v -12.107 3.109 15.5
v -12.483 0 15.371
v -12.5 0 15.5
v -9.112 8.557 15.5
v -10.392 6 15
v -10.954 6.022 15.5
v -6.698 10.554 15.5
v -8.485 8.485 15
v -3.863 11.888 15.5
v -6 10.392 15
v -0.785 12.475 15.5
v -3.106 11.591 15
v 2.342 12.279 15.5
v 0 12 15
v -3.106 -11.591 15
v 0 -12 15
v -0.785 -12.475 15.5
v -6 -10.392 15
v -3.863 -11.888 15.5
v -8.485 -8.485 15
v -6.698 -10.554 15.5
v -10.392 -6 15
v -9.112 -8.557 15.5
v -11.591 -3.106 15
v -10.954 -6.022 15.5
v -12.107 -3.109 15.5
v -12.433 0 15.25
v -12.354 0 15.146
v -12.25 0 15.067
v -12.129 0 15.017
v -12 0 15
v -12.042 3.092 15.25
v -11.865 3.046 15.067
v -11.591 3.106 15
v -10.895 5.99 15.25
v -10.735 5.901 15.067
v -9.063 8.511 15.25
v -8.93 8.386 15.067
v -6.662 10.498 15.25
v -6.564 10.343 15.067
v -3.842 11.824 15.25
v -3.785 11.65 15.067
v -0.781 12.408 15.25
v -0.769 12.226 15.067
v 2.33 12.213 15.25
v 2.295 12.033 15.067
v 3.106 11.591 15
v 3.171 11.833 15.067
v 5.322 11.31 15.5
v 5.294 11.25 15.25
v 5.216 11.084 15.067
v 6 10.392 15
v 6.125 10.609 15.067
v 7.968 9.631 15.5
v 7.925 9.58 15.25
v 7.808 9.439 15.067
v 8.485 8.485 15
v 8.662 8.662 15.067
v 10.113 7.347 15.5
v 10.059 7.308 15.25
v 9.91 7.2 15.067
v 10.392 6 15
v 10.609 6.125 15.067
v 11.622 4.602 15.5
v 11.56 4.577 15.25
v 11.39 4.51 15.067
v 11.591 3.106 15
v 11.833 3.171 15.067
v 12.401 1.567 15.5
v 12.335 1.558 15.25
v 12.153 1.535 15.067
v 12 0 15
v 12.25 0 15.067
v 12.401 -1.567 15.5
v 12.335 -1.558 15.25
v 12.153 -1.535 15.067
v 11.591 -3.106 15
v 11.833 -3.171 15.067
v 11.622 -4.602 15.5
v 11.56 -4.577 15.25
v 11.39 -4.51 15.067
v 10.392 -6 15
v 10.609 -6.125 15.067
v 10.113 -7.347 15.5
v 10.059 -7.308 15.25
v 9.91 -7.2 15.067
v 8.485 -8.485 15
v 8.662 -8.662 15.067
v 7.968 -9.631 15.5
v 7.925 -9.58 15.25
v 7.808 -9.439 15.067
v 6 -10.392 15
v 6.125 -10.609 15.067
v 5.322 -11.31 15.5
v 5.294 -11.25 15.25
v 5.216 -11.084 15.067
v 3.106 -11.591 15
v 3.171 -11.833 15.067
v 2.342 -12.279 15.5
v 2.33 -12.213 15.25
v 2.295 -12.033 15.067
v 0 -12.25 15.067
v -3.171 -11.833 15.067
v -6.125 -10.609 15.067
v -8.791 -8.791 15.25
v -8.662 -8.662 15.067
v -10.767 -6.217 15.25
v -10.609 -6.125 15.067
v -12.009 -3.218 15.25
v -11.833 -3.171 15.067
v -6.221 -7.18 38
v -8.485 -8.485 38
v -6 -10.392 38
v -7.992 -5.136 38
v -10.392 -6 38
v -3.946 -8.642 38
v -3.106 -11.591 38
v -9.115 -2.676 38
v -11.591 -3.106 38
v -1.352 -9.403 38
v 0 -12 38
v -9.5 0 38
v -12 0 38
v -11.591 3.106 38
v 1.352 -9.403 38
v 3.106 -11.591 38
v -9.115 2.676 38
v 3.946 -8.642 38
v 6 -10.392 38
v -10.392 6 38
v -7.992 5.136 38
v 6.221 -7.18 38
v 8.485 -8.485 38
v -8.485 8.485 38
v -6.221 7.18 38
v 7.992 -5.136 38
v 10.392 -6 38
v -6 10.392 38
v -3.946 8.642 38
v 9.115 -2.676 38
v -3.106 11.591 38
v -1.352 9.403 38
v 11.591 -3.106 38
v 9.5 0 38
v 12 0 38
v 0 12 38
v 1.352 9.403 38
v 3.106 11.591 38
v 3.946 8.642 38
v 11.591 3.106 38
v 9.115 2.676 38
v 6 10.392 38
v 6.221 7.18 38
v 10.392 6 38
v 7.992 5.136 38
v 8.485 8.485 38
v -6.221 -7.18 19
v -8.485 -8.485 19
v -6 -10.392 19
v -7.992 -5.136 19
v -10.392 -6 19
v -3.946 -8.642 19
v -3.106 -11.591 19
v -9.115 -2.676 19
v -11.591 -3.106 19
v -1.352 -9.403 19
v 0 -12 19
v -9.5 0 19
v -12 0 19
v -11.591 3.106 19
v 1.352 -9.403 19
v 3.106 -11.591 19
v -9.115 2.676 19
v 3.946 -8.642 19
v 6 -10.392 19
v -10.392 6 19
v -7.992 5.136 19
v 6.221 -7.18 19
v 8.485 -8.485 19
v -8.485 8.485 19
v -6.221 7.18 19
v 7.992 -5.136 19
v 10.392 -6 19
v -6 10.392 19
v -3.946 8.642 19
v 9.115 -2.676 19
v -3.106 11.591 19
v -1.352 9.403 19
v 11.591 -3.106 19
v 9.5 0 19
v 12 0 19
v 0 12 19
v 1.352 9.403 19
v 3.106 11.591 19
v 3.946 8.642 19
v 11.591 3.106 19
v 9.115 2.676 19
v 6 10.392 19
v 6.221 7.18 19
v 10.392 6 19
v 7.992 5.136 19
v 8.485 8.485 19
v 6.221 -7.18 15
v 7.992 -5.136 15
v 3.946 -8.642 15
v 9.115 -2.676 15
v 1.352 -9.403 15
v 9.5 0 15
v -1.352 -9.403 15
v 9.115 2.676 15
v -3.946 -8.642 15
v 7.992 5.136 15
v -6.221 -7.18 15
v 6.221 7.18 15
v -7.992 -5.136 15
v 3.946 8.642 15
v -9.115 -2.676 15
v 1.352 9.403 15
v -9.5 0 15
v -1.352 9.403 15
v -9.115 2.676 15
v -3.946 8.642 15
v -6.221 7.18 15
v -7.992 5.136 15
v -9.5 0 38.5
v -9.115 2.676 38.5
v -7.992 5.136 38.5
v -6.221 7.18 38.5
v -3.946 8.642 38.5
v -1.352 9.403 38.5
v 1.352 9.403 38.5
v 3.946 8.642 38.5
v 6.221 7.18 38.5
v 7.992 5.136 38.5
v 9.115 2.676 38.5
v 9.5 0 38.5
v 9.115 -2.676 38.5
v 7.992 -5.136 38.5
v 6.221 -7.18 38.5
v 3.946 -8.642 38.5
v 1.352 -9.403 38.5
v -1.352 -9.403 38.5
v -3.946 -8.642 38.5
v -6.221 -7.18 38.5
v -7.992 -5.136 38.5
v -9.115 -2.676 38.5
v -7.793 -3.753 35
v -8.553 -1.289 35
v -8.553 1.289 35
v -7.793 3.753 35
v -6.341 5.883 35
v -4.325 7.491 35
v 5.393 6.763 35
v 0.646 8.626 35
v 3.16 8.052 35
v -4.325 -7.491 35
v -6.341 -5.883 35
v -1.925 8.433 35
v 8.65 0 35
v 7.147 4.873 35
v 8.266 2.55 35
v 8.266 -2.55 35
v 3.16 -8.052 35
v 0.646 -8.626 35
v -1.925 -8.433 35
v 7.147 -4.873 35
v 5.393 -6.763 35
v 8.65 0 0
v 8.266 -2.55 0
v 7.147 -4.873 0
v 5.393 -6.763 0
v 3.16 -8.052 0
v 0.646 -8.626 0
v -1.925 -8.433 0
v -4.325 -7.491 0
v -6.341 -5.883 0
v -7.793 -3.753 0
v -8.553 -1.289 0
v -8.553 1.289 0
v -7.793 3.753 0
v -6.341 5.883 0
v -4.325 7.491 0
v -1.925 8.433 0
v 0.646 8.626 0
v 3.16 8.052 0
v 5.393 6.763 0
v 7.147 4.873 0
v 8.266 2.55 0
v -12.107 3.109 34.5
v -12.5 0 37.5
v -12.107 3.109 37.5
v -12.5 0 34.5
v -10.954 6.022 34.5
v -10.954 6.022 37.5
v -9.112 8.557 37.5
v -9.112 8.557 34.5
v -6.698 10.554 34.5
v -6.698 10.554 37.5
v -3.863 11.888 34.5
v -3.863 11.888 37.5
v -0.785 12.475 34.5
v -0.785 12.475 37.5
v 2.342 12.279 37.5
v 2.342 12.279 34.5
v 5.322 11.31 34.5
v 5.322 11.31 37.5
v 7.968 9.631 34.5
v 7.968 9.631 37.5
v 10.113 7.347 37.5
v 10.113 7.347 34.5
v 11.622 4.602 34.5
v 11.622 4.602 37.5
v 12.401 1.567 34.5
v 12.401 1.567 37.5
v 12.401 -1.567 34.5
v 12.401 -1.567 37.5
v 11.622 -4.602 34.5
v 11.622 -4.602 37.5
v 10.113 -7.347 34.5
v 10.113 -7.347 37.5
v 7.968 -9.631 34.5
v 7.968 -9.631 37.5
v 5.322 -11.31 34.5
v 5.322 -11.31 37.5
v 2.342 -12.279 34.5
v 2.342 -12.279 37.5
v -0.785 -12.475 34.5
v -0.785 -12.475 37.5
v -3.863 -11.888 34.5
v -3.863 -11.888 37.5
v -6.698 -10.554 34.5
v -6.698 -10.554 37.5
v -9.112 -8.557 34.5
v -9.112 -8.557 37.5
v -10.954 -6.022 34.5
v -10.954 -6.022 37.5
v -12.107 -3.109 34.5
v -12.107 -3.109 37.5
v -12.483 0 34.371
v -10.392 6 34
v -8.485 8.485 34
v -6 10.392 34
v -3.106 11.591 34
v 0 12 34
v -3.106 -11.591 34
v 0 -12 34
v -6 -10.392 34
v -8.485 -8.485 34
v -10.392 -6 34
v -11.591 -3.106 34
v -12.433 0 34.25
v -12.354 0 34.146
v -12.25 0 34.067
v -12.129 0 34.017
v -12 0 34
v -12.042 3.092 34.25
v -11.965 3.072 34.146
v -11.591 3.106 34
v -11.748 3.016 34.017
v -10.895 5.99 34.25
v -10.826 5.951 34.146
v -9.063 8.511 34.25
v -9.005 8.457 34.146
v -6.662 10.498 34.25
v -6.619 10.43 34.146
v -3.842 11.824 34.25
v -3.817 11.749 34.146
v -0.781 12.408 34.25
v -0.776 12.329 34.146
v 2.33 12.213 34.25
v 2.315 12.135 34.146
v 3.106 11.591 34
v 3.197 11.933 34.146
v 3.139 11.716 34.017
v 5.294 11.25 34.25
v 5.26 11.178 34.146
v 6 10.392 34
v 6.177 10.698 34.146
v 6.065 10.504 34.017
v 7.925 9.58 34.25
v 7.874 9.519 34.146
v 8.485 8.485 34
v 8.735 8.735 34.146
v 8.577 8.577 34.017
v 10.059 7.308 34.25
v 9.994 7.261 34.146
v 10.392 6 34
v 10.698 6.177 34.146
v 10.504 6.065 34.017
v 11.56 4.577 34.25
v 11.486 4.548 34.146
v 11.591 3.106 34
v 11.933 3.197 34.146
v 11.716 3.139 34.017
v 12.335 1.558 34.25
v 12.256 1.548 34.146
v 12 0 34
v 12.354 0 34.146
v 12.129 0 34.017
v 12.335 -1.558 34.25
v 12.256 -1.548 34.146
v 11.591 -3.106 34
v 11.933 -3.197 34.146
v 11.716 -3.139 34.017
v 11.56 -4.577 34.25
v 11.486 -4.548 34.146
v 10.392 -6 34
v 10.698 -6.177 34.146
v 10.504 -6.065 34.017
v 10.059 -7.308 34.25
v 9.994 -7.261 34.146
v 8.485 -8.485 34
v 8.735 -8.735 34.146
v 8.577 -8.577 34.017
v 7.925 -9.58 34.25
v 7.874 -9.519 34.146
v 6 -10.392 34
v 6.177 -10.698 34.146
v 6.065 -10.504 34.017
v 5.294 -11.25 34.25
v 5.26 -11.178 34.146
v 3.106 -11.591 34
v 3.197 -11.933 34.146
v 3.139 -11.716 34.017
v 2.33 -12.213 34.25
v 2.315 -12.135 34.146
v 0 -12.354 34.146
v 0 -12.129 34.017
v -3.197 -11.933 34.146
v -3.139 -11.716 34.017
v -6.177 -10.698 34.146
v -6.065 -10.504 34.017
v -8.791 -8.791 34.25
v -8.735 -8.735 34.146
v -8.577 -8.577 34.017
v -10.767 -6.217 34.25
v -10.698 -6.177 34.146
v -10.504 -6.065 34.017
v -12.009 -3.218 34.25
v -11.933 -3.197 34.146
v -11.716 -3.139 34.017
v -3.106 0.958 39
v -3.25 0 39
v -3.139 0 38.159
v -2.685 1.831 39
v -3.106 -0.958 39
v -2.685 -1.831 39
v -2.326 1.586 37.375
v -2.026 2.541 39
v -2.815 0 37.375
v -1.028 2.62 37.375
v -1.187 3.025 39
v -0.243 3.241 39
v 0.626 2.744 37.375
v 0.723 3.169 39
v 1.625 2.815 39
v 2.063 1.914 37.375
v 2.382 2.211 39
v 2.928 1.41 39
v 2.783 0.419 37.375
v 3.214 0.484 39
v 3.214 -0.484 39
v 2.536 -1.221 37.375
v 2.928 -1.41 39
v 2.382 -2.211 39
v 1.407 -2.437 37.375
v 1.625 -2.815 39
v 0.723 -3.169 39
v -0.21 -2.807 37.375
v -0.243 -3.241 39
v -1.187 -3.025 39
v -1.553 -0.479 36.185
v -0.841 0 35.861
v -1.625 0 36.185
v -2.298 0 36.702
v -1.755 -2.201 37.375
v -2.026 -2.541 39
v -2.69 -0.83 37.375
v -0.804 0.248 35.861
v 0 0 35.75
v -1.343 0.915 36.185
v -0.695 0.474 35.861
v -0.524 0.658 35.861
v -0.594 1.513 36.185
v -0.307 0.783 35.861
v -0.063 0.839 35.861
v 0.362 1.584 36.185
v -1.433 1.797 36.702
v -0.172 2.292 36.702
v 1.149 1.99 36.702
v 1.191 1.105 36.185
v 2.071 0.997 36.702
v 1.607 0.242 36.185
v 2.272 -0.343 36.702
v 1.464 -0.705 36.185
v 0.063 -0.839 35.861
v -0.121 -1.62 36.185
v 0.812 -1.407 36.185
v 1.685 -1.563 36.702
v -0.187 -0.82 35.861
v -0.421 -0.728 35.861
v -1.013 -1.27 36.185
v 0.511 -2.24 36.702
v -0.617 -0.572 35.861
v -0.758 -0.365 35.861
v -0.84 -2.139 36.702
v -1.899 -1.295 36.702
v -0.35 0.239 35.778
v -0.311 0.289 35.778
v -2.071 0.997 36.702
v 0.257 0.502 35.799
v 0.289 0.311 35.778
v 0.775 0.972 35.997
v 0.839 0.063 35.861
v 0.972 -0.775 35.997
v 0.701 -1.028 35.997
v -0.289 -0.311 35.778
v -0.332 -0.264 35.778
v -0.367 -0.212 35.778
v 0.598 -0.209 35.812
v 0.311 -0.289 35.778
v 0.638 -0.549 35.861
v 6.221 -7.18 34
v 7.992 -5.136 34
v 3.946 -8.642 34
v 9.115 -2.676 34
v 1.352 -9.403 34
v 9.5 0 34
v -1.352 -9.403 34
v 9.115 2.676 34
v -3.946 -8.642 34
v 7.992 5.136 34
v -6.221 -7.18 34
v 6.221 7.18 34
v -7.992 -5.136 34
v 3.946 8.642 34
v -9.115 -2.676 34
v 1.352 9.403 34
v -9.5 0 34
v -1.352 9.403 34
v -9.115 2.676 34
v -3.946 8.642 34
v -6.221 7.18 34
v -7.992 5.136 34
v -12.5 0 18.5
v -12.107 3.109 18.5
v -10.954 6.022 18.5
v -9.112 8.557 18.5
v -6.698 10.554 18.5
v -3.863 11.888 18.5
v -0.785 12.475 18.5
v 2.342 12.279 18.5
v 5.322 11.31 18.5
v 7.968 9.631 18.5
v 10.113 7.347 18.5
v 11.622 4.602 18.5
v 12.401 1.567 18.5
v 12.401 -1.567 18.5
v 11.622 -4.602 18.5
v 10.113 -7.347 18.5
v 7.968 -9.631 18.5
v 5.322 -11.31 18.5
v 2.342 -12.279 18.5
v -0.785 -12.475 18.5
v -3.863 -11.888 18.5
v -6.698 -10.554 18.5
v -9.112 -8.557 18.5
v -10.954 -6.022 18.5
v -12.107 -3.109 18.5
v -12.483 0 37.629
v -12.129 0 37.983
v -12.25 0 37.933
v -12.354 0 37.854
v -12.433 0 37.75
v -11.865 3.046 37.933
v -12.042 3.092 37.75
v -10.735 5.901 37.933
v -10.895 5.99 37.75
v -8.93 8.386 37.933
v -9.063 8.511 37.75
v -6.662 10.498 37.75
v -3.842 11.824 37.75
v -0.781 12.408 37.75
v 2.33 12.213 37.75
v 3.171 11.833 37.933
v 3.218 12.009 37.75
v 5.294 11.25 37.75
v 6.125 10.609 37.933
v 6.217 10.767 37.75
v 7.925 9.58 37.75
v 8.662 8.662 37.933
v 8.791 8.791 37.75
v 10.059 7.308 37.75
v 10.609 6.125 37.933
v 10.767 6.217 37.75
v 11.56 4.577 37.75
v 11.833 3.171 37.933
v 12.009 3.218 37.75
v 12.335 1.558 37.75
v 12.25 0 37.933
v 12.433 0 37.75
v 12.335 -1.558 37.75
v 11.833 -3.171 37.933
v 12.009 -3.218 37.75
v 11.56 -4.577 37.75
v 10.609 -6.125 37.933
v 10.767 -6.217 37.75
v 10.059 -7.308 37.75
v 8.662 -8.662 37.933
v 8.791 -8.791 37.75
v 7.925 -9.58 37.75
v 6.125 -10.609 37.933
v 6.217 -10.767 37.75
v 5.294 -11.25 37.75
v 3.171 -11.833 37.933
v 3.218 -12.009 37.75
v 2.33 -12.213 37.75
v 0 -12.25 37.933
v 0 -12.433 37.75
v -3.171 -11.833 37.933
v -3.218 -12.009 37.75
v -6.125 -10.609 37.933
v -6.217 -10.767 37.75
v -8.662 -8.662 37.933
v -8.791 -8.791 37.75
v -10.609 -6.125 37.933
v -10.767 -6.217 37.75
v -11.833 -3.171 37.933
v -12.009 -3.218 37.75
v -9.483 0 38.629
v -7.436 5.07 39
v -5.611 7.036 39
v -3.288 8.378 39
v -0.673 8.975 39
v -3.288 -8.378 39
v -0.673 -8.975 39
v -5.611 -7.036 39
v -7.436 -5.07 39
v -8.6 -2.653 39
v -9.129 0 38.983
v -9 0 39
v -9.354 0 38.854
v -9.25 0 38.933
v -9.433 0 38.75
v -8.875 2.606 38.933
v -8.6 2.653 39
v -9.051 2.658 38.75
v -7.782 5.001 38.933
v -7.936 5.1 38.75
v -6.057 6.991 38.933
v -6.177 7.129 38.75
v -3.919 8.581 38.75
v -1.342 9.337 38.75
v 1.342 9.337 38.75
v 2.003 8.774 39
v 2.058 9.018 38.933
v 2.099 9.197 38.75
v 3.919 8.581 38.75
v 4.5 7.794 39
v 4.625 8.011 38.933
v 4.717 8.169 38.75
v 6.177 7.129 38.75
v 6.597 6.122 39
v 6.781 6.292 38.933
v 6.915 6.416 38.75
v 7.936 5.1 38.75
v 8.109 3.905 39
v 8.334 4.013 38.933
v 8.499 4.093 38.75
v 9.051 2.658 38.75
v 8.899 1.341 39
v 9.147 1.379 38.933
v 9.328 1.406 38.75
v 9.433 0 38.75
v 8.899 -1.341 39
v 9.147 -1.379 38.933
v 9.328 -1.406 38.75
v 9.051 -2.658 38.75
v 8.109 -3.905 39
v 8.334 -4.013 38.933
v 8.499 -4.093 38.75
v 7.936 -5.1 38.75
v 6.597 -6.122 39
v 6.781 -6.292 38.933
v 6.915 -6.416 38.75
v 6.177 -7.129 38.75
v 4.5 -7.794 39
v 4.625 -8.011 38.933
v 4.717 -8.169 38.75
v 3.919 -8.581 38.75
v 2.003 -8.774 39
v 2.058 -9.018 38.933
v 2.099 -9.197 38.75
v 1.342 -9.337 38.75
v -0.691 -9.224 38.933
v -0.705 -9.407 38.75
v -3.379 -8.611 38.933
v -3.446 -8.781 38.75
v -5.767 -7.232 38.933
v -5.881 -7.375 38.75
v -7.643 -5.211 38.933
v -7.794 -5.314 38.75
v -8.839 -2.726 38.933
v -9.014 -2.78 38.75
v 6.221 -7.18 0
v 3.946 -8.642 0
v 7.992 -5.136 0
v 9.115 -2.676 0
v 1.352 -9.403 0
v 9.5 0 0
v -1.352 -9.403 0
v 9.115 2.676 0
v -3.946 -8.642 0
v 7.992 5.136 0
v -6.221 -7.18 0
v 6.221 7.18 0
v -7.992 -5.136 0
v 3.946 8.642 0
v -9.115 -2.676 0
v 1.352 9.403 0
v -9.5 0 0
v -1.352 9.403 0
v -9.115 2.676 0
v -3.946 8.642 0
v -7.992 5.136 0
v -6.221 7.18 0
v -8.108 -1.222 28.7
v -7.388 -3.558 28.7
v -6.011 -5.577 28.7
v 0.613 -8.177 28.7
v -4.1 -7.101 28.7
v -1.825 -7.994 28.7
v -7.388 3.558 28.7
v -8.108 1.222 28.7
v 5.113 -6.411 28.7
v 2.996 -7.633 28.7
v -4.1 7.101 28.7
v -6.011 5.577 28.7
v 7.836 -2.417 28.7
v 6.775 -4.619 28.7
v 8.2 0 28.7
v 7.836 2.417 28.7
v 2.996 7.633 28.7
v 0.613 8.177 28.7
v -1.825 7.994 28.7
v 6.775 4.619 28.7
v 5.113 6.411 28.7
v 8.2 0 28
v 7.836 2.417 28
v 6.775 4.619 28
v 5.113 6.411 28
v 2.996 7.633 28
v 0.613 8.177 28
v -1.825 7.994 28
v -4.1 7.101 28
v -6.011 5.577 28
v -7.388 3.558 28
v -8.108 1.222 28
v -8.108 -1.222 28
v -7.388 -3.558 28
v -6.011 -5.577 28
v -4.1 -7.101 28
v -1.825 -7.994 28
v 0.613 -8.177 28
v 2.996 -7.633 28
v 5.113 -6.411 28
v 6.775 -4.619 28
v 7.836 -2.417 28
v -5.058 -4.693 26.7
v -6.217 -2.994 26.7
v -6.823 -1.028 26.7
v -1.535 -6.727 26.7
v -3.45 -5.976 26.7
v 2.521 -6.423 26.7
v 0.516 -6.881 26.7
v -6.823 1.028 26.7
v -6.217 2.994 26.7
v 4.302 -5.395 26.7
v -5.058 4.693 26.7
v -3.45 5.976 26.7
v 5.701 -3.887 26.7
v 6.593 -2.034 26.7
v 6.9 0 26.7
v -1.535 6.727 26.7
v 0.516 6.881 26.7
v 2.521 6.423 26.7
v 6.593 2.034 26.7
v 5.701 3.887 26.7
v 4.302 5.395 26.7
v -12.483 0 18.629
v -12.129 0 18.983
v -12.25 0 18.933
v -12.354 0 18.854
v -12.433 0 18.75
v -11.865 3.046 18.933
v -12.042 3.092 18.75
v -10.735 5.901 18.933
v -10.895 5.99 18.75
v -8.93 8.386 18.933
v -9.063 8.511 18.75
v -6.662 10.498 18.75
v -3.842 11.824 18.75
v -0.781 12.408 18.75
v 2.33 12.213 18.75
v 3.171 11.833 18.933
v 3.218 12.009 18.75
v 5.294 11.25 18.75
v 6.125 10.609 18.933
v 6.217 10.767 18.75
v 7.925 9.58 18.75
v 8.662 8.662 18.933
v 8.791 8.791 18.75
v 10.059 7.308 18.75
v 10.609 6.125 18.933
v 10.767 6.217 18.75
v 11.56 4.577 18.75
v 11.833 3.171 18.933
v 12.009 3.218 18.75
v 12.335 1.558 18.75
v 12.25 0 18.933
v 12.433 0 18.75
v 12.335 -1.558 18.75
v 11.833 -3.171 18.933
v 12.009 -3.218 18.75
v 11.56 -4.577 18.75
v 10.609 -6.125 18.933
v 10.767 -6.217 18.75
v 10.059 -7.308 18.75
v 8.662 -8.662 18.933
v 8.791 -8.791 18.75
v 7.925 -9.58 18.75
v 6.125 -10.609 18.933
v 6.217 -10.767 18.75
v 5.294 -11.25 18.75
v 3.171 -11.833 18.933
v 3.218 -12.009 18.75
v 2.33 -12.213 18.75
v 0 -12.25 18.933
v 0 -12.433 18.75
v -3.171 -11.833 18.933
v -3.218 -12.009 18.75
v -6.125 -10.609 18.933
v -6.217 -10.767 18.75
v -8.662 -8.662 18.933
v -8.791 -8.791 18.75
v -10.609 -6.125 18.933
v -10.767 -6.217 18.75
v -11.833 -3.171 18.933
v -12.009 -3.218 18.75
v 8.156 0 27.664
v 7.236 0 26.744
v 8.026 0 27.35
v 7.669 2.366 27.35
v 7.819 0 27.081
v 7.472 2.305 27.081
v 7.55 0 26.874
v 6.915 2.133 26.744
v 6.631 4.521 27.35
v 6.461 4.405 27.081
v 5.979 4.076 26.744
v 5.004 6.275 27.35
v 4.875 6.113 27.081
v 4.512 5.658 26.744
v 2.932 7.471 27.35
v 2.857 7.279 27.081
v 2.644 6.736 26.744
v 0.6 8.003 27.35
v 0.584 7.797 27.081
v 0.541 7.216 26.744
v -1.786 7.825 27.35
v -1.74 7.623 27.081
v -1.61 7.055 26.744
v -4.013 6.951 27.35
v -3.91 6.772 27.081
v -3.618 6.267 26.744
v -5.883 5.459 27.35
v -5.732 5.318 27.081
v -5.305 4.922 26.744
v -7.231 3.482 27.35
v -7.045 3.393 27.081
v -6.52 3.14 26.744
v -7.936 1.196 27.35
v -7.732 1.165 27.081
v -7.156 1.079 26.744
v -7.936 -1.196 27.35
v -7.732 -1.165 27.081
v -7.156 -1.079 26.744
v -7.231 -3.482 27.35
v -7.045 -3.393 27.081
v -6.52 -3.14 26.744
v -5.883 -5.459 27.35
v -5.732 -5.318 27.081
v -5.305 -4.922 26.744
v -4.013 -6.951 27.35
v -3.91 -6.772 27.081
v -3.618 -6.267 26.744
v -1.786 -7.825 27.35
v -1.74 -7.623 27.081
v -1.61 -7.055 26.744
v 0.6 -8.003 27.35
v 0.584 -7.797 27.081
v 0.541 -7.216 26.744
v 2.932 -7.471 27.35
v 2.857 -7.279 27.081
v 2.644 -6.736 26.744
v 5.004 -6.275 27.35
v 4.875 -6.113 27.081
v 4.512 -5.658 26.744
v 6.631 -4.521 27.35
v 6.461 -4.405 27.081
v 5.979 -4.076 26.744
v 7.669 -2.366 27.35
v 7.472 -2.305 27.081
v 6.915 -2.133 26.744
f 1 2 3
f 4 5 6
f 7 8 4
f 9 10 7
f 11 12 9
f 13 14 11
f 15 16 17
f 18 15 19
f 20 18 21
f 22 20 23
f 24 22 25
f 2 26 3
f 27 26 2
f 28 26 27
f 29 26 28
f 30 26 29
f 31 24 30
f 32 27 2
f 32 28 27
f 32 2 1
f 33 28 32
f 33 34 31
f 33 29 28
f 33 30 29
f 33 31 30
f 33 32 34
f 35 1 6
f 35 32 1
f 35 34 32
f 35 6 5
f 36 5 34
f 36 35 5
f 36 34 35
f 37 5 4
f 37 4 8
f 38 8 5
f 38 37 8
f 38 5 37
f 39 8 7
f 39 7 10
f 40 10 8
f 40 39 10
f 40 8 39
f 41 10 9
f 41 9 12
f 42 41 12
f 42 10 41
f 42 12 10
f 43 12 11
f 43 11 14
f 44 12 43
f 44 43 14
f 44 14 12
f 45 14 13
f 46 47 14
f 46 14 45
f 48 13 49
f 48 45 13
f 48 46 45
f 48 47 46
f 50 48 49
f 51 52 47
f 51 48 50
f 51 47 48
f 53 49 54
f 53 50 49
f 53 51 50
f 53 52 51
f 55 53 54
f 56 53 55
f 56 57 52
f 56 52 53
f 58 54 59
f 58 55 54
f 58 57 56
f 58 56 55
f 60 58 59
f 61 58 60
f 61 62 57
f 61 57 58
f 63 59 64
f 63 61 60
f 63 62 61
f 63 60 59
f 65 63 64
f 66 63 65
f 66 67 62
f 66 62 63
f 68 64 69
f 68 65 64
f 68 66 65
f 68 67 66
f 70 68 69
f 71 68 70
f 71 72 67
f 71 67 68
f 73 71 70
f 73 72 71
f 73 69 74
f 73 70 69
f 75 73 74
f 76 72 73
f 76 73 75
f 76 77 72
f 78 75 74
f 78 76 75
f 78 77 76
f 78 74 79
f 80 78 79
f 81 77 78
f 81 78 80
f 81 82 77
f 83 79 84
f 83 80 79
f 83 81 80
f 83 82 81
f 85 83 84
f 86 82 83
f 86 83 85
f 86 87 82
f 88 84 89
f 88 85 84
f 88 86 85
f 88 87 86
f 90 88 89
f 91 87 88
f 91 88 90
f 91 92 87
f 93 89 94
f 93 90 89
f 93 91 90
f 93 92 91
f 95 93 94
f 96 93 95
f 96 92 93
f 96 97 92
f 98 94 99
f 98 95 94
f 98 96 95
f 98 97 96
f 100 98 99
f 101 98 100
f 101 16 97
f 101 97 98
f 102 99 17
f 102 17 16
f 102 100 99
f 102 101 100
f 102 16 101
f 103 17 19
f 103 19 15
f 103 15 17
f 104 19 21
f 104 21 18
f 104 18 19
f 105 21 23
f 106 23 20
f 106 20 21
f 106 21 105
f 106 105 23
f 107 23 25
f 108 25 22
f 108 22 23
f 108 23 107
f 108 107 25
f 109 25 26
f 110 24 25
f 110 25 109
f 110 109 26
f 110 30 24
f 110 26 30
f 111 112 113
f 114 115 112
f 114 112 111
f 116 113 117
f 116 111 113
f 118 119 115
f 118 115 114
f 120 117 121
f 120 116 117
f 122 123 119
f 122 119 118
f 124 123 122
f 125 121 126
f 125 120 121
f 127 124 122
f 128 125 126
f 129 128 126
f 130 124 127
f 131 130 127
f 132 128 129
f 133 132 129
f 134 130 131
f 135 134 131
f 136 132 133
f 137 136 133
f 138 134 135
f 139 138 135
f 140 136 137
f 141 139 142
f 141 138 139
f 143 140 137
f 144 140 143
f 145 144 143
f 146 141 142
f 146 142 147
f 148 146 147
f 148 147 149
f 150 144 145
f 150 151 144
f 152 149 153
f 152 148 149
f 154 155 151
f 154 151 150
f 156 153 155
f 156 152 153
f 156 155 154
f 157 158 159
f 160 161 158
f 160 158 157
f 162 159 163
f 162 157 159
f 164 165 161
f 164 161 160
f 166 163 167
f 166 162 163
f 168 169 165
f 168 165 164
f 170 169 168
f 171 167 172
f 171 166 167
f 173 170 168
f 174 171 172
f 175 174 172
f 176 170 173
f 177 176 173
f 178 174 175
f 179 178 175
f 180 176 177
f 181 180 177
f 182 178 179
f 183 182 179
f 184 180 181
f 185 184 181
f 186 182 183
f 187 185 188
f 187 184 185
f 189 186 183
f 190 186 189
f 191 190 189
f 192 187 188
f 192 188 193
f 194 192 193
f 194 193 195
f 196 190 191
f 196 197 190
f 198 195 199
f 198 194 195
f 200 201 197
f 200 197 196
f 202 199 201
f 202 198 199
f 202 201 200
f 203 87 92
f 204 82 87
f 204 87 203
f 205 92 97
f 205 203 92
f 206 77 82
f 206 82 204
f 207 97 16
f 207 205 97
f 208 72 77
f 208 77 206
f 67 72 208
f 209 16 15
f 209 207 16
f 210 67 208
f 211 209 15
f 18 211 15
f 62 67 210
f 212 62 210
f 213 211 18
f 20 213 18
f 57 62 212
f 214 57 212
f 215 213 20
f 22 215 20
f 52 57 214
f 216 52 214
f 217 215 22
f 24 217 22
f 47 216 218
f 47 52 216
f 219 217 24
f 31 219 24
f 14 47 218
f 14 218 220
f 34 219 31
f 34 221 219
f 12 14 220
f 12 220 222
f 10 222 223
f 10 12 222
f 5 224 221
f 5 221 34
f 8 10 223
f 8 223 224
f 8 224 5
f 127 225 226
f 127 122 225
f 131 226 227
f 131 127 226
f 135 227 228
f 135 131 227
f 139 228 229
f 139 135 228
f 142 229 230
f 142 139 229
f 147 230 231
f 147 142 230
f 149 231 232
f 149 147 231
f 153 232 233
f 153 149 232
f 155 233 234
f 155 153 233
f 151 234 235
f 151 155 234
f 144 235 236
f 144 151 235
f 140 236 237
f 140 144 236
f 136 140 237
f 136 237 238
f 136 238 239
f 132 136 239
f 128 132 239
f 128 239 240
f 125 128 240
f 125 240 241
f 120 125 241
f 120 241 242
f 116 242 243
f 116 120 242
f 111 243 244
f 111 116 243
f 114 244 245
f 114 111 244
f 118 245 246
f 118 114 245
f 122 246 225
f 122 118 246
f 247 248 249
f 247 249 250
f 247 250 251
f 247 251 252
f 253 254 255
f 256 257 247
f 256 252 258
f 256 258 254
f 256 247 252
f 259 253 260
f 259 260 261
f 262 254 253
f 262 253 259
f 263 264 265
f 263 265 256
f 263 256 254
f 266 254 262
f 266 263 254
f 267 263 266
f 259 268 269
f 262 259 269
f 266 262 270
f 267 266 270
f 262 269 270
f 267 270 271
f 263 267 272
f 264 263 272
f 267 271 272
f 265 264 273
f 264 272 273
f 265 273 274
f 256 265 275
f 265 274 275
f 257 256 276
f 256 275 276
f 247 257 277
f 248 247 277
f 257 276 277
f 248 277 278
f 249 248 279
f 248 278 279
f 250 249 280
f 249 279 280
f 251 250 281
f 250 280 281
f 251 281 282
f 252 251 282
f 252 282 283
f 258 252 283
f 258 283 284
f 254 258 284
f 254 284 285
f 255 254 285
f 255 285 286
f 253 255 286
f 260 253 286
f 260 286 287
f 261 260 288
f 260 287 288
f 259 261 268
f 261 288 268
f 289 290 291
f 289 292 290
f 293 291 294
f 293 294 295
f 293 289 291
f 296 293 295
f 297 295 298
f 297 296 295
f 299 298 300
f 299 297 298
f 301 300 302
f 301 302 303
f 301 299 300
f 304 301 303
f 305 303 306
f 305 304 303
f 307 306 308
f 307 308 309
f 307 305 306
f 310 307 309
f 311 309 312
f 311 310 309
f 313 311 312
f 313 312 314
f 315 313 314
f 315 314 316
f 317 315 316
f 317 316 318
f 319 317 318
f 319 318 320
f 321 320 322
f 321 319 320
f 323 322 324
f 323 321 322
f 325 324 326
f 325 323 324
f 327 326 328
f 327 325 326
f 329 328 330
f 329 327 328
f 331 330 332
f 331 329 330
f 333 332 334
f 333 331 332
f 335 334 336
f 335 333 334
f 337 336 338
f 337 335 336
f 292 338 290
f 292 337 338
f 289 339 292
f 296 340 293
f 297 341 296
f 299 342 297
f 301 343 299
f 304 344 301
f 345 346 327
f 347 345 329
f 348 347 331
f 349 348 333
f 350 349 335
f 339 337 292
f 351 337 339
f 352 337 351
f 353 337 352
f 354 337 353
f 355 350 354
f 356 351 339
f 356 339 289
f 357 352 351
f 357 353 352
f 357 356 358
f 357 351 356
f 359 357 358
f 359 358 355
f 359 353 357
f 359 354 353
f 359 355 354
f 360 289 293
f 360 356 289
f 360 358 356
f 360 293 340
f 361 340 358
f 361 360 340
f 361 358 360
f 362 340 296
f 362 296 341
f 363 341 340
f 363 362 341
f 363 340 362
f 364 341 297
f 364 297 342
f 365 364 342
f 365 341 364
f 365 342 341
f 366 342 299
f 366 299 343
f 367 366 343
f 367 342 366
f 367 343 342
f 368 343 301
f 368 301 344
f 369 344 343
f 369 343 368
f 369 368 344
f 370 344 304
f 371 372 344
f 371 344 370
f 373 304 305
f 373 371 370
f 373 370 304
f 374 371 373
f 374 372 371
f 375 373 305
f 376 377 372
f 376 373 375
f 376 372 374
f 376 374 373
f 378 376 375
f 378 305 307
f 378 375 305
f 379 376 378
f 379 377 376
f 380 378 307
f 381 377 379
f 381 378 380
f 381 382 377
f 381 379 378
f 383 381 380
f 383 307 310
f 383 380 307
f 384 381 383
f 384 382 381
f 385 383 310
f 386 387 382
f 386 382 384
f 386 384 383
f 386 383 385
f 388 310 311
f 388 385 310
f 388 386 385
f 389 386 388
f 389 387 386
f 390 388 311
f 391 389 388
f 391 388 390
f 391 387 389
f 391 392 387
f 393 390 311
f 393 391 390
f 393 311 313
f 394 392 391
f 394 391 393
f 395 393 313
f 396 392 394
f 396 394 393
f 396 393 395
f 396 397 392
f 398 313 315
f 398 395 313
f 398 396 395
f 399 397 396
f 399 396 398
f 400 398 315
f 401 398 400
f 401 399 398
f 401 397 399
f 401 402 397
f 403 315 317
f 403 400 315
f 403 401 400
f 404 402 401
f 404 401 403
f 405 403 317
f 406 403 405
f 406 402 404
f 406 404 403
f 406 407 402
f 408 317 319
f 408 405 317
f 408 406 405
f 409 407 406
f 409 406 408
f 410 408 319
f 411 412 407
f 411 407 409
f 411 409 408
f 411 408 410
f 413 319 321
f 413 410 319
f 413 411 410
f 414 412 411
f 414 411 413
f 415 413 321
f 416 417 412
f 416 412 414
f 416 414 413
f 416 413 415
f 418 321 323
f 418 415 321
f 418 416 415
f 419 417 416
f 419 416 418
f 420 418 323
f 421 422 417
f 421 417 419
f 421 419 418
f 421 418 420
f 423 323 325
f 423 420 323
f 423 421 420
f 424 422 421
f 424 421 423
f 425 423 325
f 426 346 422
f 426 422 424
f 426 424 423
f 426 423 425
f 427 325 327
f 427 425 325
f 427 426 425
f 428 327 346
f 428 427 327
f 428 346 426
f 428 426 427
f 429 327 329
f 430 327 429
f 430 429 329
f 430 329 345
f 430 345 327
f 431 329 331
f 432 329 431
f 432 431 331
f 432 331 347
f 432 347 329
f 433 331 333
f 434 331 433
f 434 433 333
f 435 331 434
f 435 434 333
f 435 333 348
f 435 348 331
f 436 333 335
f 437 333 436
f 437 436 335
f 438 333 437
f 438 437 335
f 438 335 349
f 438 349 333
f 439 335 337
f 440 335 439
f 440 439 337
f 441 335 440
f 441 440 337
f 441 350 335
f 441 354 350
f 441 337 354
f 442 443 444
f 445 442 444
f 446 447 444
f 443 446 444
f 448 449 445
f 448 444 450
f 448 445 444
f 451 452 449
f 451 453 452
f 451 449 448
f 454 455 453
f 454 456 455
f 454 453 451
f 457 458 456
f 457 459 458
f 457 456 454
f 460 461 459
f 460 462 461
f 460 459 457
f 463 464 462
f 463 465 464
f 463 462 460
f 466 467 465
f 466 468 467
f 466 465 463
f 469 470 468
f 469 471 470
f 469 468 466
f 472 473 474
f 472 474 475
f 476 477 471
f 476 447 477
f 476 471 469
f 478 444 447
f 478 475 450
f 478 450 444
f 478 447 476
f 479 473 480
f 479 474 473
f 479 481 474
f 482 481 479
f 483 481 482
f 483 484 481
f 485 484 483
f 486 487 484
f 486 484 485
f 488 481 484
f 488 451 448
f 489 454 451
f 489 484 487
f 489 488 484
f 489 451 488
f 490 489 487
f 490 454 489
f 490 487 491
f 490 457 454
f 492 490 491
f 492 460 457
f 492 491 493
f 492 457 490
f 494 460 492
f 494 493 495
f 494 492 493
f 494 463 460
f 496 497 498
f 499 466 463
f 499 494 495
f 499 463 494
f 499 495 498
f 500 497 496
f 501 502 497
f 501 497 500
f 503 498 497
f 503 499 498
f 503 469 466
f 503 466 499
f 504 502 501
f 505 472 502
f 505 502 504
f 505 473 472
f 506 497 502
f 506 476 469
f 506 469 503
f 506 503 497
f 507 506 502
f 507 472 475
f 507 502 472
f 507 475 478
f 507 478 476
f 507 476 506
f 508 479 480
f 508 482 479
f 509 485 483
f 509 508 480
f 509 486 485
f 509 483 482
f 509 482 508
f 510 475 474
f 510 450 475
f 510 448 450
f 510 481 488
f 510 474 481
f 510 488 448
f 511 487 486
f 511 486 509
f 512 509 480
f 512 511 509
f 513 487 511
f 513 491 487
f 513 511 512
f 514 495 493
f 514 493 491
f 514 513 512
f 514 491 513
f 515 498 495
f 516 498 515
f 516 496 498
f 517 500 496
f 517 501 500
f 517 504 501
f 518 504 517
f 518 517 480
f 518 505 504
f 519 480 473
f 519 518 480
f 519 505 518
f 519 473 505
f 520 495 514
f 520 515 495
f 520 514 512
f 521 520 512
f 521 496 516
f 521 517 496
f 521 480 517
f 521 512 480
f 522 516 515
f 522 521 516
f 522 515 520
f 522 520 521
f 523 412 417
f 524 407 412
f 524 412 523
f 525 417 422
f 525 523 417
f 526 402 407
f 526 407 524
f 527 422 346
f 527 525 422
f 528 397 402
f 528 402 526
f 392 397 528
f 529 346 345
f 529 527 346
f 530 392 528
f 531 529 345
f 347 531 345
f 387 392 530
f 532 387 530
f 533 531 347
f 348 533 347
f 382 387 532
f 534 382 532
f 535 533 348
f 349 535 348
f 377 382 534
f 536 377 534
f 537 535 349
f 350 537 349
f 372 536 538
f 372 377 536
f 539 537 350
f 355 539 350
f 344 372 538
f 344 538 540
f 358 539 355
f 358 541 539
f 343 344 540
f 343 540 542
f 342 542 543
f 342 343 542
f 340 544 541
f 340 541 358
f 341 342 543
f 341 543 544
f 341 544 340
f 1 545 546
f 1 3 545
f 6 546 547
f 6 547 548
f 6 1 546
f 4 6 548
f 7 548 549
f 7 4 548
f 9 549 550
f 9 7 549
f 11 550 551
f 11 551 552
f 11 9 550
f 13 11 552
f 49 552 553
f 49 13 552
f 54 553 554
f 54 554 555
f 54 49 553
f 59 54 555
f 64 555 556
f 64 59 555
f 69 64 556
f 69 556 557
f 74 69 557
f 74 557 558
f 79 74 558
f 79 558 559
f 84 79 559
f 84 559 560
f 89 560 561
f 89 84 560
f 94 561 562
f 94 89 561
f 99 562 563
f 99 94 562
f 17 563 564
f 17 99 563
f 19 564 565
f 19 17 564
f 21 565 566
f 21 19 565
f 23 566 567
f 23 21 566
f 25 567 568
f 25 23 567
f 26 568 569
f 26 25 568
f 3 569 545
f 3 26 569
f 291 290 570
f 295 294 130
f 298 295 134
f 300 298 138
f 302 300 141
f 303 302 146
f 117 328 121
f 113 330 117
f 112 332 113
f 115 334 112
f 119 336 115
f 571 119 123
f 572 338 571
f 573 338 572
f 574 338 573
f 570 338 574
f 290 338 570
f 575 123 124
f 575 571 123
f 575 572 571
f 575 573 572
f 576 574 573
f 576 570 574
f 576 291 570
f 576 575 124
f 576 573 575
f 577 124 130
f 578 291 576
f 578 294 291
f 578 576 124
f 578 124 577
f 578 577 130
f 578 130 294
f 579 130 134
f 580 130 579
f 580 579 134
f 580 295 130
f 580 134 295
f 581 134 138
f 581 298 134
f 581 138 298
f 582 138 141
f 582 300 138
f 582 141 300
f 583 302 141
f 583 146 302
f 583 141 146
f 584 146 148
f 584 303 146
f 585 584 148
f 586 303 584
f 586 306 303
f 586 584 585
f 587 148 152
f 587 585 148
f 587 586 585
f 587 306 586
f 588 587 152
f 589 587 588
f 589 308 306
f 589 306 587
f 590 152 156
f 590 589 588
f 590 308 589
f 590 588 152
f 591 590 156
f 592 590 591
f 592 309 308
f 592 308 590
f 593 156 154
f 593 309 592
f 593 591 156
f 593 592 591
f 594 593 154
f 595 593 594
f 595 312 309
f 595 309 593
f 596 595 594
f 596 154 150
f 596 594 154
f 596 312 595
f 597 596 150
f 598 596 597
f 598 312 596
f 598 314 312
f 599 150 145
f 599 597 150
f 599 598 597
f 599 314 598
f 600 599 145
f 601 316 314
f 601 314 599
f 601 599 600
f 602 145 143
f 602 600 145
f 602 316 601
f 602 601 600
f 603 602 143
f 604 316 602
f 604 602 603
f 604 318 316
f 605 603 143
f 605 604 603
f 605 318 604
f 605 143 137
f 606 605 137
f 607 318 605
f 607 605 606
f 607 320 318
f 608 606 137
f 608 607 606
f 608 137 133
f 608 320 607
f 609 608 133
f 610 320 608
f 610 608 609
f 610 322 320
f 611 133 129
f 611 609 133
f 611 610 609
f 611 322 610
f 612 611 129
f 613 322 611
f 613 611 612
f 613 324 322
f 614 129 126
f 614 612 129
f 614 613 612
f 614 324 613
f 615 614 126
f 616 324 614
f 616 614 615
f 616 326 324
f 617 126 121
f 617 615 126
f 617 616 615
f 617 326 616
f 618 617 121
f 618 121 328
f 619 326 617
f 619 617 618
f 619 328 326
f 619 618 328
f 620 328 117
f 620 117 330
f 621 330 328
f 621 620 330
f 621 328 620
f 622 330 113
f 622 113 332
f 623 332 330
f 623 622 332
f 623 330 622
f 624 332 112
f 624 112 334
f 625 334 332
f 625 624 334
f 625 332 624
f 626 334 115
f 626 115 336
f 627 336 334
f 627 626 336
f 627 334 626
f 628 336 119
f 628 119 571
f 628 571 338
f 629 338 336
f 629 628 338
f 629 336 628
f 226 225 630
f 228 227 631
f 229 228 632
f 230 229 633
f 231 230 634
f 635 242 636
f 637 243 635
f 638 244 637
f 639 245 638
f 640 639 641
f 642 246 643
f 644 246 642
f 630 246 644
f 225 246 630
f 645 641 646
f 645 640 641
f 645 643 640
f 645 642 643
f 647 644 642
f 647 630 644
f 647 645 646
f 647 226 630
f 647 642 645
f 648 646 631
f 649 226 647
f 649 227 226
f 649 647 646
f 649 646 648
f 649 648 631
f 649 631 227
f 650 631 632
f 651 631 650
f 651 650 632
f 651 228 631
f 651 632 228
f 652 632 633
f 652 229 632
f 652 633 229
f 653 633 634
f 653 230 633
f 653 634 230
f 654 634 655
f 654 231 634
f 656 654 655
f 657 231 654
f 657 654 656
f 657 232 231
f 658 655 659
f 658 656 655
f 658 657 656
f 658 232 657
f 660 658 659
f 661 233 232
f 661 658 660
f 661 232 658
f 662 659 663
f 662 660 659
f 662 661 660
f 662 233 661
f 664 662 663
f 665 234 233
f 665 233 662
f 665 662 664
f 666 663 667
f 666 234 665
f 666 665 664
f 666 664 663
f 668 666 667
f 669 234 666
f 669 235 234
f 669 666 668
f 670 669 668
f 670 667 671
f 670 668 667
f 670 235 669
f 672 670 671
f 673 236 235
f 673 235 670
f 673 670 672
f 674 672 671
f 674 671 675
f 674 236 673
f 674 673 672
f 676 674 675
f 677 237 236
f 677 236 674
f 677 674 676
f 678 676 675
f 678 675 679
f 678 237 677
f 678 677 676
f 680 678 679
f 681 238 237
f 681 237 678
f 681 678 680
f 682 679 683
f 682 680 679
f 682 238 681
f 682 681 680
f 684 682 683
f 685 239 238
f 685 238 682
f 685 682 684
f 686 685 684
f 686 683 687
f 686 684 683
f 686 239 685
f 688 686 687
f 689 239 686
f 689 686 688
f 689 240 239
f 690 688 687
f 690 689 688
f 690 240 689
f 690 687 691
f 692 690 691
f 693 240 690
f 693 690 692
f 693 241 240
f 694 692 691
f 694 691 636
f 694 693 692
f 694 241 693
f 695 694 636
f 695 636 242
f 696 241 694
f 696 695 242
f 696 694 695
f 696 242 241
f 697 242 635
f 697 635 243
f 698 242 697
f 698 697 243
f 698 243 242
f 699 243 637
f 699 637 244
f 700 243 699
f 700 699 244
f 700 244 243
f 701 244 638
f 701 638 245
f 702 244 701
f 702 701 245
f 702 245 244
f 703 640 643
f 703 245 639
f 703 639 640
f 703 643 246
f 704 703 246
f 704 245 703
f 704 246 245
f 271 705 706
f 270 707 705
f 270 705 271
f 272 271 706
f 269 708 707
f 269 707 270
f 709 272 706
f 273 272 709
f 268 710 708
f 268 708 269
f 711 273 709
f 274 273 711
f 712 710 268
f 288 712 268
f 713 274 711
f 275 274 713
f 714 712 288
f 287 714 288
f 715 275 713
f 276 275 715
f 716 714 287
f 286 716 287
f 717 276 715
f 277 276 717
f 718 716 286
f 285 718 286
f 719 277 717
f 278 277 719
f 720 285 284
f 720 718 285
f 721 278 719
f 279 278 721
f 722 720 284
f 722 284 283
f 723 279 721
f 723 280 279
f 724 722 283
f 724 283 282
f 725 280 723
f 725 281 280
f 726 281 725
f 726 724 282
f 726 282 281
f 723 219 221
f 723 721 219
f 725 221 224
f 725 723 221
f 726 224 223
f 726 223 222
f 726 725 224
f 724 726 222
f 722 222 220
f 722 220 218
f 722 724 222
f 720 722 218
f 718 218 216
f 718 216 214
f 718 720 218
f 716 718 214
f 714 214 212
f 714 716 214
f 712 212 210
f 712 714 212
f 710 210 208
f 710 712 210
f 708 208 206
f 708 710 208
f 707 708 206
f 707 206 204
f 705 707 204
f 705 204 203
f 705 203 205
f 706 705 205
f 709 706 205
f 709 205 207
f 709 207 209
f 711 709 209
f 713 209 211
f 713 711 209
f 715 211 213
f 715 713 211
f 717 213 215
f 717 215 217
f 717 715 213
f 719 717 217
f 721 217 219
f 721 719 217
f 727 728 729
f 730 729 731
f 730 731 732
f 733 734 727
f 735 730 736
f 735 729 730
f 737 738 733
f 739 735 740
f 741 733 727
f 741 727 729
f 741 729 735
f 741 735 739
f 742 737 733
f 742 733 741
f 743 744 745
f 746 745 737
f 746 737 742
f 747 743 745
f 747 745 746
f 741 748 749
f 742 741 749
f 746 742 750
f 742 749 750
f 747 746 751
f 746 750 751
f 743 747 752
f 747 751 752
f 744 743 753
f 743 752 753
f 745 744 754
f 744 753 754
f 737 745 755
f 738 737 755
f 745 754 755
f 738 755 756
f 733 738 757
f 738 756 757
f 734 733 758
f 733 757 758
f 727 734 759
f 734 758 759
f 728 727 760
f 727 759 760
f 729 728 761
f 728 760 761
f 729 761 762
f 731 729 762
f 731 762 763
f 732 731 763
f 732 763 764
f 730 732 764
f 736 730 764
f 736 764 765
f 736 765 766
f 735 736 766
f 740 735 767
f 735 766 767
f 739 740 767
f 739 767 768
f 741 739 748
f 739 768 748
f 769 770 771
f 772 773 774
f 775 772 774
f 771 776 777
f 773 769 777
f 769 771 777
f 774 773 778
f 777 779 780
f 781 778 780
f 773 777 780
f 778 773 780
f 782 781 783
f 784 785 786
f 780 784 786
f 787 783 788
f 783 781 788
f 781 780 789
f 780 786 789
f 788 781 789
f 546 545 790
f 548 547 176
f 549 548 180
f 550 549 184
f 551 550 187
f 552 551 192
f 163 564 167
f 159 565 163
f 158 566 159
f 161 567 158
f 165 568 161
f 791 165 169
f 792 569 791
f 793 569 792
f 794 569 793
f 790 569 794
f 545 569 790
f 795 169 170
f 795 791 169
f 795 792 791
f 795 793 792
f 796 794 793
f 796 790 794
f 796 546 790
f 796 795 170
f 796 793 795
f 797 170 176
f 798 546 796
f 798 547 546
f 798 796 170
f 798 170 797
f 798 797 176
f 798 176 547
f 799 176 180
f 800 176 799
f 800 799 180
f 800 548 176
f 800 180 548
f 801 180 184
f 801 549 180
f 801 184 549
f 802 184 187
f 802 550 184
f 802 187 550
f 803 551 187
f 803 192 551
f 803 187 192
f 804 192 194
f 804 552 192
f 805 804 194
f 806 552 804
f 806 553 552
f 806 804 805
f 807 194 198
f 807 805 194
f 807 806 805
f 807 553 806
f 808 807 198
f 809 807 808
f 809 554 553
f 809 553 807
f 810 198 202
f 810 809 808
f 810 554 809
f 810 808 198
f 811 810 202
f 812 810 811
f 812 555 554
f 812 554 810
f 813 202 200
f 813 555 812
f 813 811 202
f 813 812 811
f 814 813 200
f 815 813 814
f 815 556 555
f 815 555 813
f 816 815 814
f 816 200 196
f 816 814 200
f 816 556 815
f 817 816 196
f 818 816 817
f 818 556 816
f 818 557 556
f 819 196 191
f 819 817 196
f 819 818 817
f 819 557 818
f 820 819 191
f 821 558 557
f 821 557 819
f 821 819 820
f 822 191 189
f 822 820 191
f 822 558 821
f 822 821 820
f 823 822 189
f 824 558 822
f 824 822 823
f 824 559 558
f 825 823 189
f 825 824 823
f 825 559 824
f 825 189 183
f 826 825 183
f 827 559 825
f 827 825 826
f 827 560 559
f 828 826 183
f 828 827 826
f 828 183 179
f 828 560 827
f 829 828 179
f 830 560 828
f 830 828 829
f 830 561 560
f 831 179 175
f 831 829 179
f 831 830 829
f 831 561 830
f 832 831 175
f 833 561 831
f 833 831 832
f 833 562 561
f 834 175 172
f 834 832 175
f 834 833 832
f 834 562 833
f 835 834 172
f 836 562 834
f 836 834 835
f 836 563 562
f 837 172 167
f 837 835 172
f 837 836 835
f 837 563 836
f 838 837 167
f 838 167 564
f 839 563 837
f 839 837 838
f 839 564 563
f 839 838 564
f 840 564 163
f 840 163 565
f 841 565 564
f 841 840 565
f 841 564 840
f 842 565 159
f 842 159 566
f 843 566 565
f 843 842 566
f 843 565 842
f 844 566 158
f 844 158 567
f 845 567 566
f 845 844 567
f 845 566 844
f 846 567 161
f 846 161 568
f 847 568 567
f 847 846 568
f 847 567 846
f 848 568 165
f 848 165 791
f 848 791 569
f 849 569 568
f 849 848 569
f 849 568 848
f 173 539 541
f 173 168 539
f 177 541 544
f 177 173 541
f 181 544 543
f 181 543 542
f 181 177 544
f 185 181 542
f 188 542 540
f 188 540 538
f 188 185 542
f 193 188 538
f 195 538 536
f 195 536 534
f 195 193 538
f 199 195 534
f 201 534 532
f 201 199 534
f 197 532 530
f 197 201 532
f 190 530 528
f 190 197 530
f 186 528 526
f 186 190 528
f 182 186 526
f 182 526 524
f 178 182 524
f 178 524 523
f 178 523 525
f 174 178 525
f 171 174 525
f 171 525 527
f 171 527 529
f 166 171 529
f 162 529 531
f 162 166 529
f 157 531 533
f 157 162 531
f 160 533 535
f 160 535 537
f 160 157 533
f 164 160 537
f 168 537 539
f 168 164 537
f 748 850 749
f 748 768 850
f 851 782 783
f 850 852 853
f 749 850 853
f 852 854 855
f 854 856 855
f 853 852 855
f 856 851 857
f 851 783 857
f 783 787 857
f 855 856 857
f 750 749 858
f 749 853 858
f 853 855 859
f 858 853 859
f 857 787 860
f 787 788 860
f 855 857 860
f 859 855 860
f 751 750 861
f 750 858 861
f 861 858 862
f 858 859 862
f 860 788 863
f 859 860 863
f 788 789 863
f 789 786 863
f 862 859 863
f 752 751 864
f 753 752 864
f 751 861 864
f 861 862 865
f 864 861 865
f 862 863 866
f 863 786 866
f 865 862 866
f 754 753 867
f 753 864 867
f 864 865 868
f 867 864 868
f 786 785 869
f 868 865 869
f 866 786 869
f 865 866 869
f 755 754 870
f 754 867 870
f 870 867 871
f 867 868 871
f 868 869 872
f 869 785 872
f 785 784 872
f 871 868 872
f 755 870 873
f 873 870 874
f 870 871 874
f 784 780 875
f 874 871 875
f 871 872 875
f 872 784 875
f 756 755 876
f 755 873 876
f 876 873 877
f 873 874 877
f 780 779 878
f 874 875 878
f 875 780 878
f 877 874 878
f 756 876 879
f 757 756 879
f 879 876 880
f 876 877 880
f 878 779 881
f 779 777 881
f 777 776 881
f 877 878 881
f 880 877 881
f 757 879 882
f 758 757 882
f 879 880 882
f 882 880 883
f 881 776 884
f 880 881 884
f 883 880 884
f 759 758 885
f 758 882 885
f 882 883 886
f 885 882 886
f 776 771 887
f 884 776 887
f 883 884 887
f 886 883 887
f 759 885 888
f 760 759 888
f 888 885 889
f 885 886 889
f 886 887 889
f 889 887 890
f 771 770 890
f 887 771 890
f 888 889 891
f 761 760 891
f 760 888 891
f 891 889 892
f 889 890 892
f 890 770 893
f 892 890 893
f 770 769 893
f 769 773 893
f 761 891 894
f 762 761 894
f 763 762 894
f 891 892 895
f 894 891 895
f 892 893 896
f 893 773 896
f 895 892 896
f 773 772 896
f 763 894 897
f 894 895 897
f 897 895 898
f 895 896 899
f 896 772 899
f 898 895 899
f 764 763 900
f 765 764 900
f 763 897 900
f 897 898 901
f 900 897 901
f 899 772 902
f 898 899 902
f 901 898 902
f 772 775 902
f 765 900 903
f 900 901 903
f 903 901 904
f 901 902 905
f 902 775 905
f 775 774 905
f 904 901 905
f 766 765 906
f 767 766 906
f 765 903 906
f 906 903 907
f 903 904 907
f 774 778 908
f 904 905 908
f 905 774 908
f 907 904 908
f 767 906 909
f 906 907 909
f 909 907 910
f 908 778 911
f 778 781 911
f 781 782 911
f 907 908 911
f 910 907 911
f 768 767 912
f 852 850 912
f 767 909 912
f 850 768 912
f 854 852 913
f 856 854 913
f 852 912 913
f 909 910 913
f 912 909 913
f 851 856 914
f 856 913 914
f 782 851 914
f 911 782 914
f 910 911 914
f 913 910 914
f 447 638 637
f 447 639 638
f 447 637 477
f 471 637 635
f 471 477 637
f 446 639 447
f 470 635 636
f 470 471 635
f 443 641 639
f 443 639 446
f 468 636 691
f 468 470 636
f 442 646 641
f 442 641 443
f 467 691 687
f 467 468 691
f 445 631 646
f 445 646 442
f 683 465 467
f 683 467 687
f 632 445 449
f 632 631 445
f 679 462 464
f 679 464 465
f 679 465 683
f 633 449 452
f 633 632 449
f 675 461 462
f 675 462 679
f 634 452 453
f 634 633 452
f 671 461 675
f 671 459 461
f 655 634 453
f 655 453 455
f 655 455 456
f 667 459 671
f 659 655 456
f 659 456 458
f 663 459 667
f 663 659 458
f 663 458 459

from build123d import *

# Parameters (mm, degrees)
F2_R     = 8.65
F3_DEPTH = 35
F5_R     = 8.2
F6_DEPTH = 2
F7_R     = 1.3


with BuildPart() as f1:
    # F0 (on Front) → F1 (revolve)
    with BuildSketch(Plane.XZ):
        with BuildLine():
            Line((-9.5, 0), (0, 0))
            Line((0, 0), (0, 35.75))
            ThreePointArc((0, 35.75), (-2.298097, 36.701903), (-3.25, 39))
            Line((-3.25, 39), (-9, 39))
            ThreePointArc((-9, 39), (-9.353553, 38.853553), (-9.5, 38.5))
            Line((-9.5, 38.5), (-9.5, 38))
            Line((-9.5, 38), (-12, 38))
            ThreePointArc((-12, 38), (-12.353553, 37.853553), (-12.5, 37.5))
            Line((-12.5, 37.5), (-12.5, 34.5))
            ThreePointArc((-12.5, 34.5), (-12.353553, 34.146447), (-12, 34))
            Line((-12, 34), (-9.5, 34))
            Line((-9.5, 34), (-9.5, 19))
            Line((-9.5, 19), (-12, 19))
            ThreePointArc((-12, 19), (-12.353553, 18.853553), (-12.5, 18.5))
            Line((-12.5, 18.5), (-12.5, 15.5))
            ThreePointArc((-12.5, 15.5), (-12.353553, 15.146447), (-12, 15))
            Line((-12, 15), (-9.5, 15))
            Line((-9.5, 15), (-9.5, 0))
        make_face()
    revolve(axis=Axis((0, 0, 19.5), (0, 0, -1)))

    # F2 (on face) → F3 (cut)
    with BuildSketch(Plane(origin=(0, 0, 0), x_dir=(1, 0, 0), z_dir=(0, 0, -1))):
        Circle(F2_R)
    extrude(amount=-F3_DEPTH, mode=Mode.SUBTRACT)


with BuildPart() as f6:
    # F5 (on offset) → F6 (new body)
    with BuildSketch(Plane.XY.offset(26.7)):
        Circle(F5_R)
    extrude(amount=F6_DEPTH)

    # F7
    f7_edges = [f6.edges().sort_by_distance(p)[0] for p in [
        (-8.2, 0, 26.7),
    ]]
    fillet(f7_edges, radius=F7_R)


solid = Compound([f1.part, f6.part])
